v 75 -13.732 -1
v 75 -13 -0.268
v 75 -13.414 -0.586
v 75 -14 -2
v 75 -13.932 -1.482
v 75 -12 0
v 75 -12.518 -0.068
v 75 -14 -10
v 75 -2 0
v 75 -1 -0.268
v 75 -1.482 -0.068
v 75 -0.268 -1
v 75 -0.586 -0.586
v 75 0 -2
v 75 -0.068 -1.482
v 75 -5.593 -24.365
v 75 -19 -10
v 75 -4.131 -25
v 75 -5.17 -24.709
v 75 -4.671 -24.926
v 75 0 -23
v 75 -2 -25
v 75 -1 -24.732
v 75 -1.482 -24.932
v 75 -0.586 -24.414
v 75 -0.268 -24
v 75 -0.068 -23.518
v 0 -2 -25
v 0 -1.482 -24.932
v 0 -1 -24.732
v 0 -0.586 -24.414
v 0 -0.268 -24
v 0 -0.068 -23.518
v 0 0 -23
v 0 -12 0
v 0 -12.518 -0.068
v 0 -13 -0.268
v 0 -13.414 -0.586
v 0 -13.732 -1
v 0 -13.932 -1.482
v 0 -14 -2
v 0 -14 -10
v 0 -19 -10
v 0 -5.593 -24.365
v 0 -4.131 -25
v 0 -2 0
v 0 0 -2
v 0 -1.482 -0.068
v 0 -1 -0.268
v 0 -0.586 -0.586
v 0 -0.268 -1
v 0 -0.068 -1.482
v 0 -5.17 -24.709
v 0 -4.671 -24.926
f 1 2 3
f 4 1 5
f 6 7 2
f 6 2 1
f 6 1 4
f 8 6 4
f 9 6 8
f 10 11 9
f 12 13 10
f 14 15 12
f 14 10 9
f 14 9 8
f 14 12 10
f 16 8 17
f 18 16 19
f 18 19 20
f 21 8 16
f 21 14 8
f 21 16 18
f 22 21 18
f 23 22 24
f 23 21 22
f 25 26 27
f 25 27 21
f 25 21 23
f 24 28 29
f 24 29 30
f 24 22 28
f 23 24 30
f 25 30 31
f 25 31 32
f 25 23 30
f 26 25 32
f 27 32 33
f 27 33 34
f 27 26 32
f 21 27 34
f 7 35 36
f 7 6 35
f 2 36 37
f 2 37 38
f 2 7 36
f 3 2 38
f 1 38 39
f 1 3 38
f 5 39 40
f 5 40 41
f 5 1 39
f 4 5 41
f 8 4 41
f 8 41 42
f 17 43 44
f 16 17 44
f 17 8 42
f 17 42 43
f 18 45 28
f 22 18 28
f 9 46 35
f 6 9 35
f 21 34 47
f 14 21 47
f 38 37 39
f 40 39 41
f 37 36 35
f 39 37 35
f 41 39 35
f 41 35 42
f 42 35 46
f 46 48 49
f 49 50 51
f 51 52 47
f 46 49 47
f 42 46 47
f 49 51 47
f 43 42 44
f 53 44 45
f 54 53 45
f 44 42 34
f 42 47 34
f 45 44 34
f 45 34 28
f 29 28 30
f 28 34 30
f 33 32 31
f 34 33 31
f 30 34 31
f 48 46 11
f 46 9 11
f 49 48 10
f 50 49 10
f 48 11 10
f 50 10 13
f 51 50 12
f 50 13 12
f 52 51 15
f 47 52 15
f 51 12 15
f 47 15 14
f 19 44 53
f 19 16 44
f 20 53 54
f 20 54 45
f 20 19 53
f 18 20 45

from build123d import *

# Parameters (mm, degrees)
EXTRUDE_1_DEPTH = 75
FILLET_1_R      = 2


with BuildPart() as part:
    # ｽｹｯﾁ1 → ﾎﾞｽ - 押し出し1 (new body)
    with BuildSketch(Plane(origin=(0, 0, 0), x_dir=(0, 0, -1), z_dir=(1, 0, 0))):
        Polygon((0, 0), (0, -14), (10, -14), (10, -19), (25, -5), (25, 0), align=None)
    extrude(amount=EXTRUDE_1_DEPTH)

    # ﾌｨﾚｯﾄ1
    fillet_1_edges = [part.edges().sort_by_distance(p)[0] for p in [
        (37.5, 0, -25),
        (37.5, -5, -25),
        (37.5, -14, 0),
        (37.5, 0, 0),
    ]]
    fillet(fillet_1_edges, radius=FILLET_1_R)


solid = part.part
